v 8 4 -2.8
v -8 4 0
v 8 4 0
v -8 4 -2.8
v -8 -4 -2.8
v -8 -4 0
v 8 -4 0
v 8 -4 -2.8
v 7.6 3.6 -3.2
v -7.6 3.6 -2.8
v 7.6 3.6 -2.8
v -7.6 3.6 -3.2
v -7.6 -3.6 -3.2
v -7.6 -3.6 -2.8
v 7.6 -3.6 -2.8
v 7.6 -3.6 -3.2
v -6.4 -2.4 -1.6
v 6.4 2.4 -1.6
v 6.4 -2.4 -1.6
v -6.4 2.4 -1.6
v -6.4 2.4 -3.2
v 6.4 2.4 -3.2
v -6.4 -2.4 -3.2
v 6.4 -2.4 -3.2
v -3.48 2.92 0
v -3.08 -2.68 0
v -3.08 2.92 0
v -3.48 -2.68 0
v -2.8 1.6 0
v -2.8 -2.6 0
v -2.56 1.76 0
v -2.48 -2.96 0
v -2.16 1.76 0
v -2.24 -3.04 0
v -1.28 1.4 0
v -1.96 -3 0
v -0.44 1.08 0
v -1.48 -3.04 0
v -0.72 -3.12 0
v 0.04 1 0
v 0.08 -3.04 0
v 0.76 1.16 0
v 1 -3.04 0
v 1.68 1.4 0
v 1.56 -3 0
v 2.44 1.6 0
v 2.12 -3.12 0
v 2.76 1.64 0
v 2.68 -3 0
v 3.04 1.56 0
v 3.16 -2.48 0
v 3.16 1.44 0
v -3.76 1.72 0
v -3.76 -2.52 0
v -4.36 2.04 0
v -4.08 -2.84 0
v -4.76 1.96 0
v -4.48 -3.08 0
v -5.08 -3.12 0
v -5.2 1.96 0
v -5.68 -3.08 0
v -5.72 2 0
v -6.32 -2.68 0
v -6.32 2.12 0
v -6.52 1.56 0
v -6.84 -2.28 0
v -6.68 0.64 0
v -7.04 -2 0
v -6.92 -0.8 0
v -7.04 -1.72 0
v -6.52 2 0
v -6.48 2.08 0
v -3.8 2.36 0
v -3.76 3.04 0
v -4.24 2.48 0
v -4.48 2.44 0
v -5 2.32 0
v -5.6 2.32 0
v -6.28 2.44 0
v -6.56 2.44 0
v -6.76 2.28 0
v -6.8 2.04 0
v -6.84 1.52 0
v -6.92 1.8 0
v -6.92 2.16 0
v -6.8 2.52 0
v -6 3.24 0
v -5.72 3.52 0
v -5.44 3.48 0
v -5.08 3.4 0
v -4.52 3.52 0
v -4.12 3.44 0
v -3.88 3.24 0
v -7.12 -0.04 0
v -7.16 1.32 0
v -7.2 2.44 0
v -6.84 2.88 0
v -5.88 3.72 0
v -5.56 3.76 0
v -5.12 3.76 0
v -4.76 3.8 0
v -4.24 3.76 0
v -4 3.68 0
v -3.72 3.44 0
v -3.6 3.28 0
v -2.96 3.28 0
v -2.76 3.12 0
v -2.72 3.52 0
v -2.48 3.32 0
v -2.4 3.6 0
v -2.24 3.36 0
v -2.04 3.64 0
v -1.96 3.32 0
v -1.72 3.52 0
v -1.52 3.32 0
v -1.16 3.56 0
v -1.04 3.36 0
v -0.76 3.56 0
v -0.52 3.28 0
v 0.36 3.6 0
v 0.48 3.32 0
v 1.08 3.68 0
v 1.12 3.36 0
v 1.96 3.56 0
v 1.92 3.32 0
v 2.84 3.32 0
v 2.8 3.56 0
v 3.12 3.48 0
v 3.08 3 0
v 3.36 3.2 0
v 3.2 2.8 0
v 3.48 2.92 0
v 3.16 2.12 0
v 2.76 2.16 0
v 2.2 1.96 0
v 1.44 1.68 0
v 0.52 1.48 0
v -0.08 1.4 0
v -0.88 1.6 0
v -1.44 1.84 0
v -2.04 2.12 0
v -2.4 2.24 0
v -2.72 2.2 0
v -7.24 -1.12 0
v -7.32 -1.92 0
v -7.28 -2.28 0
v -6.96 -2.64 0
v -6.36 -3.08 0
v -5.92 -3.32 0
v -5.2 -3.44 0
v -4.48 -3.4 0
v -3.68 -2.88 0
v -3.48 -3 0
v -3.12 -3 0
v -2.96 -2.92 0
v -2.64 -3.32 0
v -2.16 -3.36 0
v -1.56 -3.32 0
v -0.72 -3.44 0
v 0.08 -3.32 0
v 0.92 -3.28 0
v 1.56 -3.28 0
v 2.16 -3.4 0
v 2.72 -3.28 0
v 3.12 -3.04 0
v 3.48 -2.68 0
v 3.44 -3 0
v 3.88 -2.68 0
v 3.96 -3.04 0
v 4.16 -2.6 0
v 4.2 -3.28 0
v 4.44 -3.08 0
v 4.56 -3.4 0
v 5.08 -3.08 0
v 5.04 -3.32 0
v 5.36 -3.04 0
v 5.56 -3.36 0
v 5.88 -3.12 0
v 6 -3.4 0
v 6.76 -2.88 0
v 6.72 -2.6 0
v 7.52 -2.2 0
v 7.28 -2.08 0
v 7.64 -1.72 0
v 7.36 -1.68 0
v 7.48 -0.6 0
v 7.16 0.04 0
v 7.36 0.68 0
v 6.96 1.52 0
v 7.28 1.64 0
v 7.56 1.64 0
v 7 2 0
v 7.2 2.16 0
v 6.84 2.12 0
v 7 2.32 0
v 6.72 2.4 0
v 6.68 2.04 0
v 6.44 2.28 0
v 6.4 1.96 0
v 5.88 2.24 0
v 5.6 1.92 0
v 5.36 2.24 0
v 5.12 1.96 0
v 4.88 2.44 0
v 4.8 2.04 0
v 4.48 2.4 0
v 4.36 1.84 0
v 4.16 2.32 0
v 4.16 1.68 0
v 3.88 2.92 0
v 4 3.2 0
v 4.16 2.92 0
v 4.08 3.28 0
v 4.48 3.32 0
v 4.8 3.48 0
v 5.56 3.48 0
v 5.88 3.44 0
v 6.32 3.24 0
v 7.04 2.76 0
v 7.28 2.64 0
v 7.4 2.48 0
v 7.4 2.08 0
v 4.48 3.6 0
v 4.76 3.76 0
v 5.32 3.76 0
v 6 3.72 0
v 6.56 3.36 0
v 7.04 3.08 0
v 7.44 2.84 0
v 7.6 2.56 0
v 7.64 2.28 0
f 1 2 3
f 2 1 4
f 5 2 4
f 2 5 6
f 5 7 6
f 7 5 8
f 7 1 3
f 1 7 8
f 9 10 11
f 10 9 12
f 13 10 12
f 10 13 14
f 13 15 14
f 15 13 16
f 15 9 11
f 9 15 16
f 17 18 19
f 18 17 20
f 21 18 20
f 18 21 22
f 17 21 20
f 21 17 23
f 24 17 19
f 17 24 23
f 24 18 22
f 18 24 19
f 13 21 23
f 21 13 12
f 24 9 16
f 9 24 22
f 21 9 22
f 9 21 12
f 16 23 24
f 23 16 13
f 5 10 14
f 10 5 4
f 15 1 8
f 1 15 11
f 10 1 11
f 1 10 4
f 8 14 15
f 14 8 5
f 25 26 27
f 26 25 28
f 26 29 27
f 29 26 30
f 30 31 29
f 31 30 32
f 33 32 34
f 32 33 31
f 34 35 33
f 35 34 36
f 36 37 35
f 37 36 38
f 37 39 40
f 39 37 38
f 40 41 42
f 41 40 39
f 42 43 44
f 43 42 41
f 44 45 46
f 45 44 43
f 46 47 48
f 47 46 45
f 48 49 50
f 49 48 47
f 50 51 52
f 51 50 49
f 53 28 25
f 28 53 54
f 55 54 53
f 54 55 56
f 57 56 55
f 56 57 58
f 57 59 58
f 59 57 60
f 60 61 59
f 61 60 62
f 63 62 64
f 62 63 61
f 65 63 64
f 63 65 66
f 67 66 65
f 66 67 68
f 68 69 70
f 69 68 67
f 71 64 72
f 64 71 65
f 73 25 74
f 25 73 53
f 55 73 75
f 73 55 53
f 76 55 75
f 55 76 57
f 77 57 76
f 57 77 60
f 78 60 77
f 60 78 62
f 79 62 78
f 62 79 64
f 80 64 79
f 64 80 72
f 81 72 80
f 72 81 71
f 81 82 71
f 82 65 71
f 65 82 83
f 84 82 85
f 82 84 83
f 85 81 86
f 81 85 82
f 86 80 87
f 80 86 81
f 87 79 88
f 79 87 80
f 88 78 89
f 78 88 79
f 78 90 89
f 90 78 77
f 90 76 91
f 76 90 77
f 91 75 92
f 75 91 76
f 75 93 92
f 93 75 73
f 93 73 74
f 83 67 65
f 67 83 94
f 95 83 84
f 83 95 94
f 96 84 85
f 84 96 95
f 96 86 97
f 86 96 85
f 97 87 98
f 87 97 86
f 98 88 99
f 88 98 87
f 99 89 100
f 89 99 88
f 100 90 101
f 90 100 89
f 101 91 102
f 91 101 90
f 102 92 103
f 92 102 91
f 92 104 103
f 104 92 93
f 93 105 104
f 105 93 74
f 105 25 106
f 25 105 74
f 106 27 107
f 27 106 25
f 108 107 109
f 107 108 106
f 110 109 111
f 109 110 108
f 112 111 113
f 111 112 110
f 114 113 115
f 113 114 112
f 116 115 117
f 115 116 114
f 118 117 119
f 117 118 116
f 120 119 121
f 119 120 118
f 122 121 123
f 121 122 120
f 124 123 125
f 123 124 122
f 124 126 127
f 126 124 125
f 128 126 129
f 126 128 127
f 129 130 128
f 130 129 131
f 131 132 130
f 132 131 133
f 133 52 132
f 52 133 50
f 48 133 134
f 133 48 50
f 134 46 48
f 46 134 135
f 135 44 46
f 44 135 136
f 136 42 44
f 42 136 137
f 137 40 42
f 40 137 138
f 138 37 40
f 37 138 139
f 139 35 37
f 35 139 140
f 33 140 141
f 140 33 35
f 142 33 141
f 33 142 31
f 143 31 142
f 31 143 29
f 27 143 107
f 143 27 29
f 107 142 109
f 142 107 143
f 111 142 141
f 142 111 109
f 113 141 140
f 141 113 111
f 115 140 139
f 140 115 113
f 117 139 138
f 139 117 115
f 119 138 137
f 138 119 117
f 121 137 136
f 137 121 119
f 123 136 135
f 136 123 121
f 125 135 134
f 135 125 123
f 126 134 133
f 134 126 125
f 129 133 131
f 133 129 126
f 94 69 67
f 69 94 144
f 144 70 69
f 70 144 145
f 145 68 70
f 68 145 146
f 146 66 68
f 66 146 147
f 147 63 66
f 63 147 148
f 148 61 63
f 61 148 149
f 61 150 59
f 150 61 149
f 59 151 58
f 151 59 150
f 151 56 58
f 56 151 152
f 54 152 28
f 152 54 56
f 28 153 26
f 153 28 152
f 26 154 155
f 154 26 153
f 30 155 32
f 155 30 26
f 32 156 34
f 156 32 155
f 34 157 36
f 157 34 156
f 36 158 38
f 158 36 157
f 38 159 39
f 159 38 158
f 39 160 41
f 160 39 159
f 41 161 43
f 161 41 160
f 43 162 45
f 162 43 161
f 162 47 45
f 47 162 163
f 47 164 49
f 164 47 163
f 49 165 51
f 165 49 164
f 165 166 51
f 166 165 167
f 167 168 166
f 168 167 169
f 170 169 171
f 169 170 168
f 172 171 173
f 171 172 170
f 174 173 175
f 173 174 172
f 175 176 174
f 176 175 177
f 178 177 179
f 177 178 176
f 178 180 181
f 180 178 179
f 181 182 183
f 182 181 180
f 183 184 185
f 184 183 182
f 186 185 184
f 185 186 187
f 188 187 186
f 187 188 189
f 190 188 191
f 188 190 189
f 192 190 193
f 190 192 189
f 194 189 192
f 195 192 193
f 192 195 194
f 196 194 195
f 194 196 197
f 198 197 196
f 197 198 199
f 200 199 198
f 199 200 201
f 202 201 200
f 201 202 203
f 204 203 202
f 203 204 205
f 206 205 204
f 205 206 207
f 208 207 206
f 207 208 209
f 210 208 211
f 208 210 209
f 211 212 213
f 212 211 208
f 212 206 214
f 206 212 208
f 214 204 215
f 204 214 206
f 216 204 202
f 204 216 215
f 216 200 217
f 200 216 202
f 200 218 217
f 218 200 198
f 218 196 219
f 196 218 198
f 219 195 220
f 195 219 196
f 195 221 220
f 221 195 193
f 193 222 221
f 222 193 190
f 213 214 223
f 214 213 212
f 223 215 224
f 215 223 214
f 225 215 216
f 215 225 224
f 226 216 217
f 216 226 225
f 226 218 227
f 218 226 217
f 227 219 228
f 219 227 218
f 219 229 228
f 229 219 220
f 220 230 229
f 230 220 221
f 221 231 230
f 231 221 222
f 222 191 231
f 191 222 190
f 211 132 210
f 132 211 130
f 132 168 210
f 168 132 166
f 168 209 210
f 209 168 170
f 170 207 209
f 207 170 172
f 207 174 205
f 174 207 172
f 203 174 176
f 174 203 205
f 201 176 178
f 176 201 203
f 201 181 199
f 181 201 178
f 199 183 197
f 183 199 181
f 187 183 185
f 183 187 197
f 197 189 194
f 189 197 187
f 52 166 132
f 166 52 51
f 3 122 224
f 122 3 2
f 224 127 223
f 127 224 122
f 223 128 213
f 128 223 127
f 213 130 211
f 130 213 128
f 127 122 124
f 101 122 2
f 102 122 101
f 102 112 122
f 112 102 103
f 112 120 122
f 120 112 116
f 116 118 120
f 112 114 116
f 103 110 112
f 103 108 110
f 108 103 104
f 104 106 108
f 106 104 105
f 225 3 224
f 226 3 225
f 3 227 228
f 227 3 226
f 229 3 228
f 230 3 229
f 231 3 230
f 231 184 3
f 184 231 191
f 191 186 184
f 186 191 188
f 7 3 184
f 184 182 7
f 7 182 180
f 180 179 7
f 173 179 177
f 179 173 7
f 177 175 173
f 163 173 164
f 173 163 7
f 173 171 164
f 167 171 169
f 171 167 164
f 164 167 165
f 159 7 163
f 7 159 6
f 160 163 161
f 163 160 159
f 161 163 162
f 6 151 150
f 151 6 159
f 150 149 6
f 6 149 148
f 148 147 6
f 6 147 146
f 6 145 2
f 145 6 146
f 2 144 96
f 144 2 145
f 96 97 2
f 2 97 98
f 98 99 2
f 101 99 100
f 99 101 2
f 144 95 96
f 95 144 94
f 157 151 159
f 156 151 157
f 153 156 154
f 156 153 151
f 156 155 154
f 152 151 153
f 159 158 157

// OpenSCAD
// file: ../p/box5.scad
use <../lib.scad>
function ldraw_lib__box5() = [
// 0 Box with 5 Faces and All Edges
// 0 Name: box5.dat
// 0 Author: James Jessiman
// 0 !LDRAW_ORG Primitive UPDATE 2012-01
// 0 !LICENSE Licensed under CC BY 2.0 and CC BY 4.0 : see CAreadme.txt
// 
// 0 BFC CERTIFY CCW
  [0,"BFC","CERTIFY"],
  [0,"BFC","CCW"],
// 
// 0 !HISTORY 2002-04-03 [sbliss] Modified for BFC compliance
// 0 !HISTORY 2002-04-25 [PTadmin] Official Update 2002-02
// 0 !HISTORY 2007-06-24 [PTadmin] Header formatted for Contributor Agreement
// 0 !HISTORY 2008-07-01 [PTadmin] Official Update 2008-01
// 0 !HISTORY 2012-02-16 [Philo] Changed to CCW
// 0 !HISTORY 2012-03-30 [PTadmin] Official Update 2012-01
// 
// 
// 2 24 1 1 1 -1 1 1
  [2,24,1,1,1,-1,1,1],
// 2 24 -1 1 1 -1 1 -1
  [2,24,-1,1,1,-1,1,-1],
// 2 24 -1 1 -1 1 1 -1
  [2,24,-1,1,-1,1,1,-1],
// 2 24 1 1 -1 1 1 1
  [2,24,1,1,-1,1,1,1],
// 2 24 1 0 1 -1 0 1
  [2,24,1,0,1,-1,0,1],
// 2 24 -1 0 1 -1 0 -1
  [2,24,-1,0,1,-1,0,-1],
// 2 24 -1 0 -1 1 0 -1
  [2,24,-1,0,-1,1,0,-1],
// 2 24 1 0 -1 1 0 1
  [2,24,1,0,-1,1,0,1],
// 2 24 1 0 1 1 1 1
  [2,24,1,0,1,1,1,1],
// 2 24 -1 0 1 -1 1 1
  [2,24,-1,0,1,-1,1,1],
// 2 24 1 0 -1 1 1 -1
  [2,24,1,0,-1,1,1,-1],
// 2 24 -1 0 -1 -1 1 -1
  [2,24,-1,0,-1,-1,1,-1],
// 4 16 -1 1 1 1 1 1 1 1 -1 -1 1 -1
  [4,16,-1,1,1,1,1,1,1,1,-1,-1,1,-1],
// 4 16 -1 1 1 -1 0 1 1 0 1 1 1 1
  [4,16,-1,1,1,-1,0,1,1,0,1,1,1,1],
// 4 16 -1 1 -1 -1 0 -1 -1 0 1 -1 1 1
  [4,16,-1,1,-1,-1,0,-1,-1,0,1,-1,1,1],
// 4 16 1 1 -1 1 0 -1 -1 0 -1 -1 1 -1
  [4,16,1,1,-1,1,0,-1,-1,0,-1,-1,1,-1],
// 4 16 1 1 1 1 0 1 1 0 -1 1 1 -1
  [4,16,1,1,1,1,0,1,1,0,-1,1,1,-1],
];
makepoly(ldraw_lib__box5(), line=0.2);
// file: ../p/box4.scad
use <../lib.scad>
function ldraw_lib__box4() = [
// 0 Box with 4 Faces (2 Parallel Pairs) and All Edges
// 0 Name: box4.dat
// 0 Author: James Jessiman
// 0 !LDRAW_ORG Primitive UPDATE 2012-01
// 0 !LICENSE Licensed under CC BY 2.0 and CC BY 4.0 : see CAreadme.txt
// 
// 0 BFC CERTIFY CCW
  [0,"BFC","CERTIFY"],
  [0,"BFC","CCW"],
// 
// 0 !HISTORY 2002-04-03 [sbliss] Modified for BFC compliance
// 0 !HISTORY 2002-04-25 [PTadmin] Official Update 2002-02
// 0 !HISTORY 2007-06-24 [PTadmin] Header formatted for Contributor Agreement
// 0 !HISTORY 2008-07-01 [PTadmin] Official Update 2008-01
// 0 !HISTORY 2012-02-16 [Philo] Changed to CCW
// 0 !HISTORY 2012-03-30 [PTadmin] Official Update 2012-01
// 
// 
// 2 24 1 1 1 -1 1 1
  [2,24,1,1,1,-1,1,1],
// 2 24 -1 1 1 -1 1 -1
  [2,24,-1,1,1,-1,1,-1],
// 2 24 -1 1 -1 1 1 -1
  [2,24,-1,1,-1,1,1,-1],
// 2 24 1 1 -1 1 1 1
  [2,24,1,1,-1,1,1,1],
// 2 24 1 0 1 -1 0 1
  [2,24,1,0,1,-1,0,1],
// 2 24 -1 0 1 -1 0 -1
  [2,24,-1,0,1,-1,0,-1],
// 2 24 -1 0 -1 1 0 -1
  [2,24,-1,0,-1,1,0,-1],
// 2 24 1 0 -1 1 0 1
  [2,24,1,0,-1,1,0,1],
// 2 24 1 0 1 1 1 1
  [2,24,1,0,1,1,1,1],
// 2 24 -1 0 1 -1 1 1
  [2,24,-1,0,1,-1,1,1],
// 2 24 1 0 -1 1 1 -1
  [2,24,1,0,-1,1,1,-1],
// 2 24 -1 0 -1 -1 1 -1
  [2,24,-1,0,-1,-1,1,-1],
// 4 16 -1 1 1 -1 0 1 1 0 1 1 1 1
  [4,16,-1,1,1,-1,0,1,1,0,1,1,1,1],
// 4 16 -1 1 -1 -1 0 -1 -1 0 1 -1 1 1
  [4,16,-1,1,-1,-1,0,-1,-1,0,1,-1,1,1],
// 4 16 1 1 -1 1 0 -1 -1 0 -1 -1 1 -1
  [4,16,1,1,-1,1,0,-1,-1,0,-1,-1,1,-1],
// 4 16 1 1 1 1 0 1 1 0 -1 1 1 -1
  [4,16,1,1,1,1,0,1,1,0,-1,1,1,-1],
];
makepoly(ldraw_lib__box4(), line=0.2);
// file: s/3069p0fs02.scad
use <../../lib.scad>
function ldraw_lib__s__3069p0fs02() = [
// 0 ~Tile  1 x  2 with Bedroll Pattern - Frame
// 0 Name: s\3069p0fs02.dat
// 0 Author: Alex Taylor [anathema]
// 0 !LDRAW_ORG Subpart UPDATE 2014-01
// 0 !LICENSE Licensed under CC BY 2.0 and CC BY 4.0 : see CAreadme.txt
// 
// 0 BFC CERTIFY CCW
  [0,"BFC","CERTIFY"],
  [0,"BFC","CCW"],
// 
// 0 !HISTORY 2014-01-18 [smr] moved bedroll frame from from 3069bp0f to s\3069p0fs02.dat
// 0 !HISTORY 2014-06-21 [PTadmin] Official Update 2014-01
// 
// 
// 4 16 11.9 0 9.4 20 0 10 -20 0 10 2.7 0 9.2
  [4,16,11.9,0,9.4,20,0,10,-20,0,10,2.7,0,9.2],
// 4 16 11.9 0 9.4 2.7 0 9.2 7 0 8.9 11.2 0 9
  [4,16,11.9,0,9.4,2.7,0,9.2,7,0,8.9,11.2,0,9],
// 4 16 11.2 0 9 7 0 8.9 7.8 0 8.7 10.2 0 8.2
  [4,16,11.2,0,9,7,0,8.9,7.8,0,8.7,10.2,0,8.2],
// 4 16 10.2 0 8.2 7.8 0 8.7 8.4 0 8 10 0 8
  [4,16,10.2,0,8.2,7.8,0,8.7,8.4,0,8,10,0,8],
// 3 16 7 0 8.9 2.7 0 9.2 4.9 0 8.9
  [3,16,7,0,8.9,2.7,0,9.2,4.9,0,8.9],
// 3 16 -11.9 0 9.5 2.7 0 9.2 -20 0 10
  [3,16,-11.9,0,9.5,2.7,0,9.2,-20,0,10],
// 3 16 -10.6 0 9.4 2.7 0 9.2 -11.9 0 9.5
  [3,16,-10.6,0,9.4,2.7,0,9.2,-11.9,0,9.5],
// 4 16 2.7 0 9.2 -10.6 0 9.4 -10 0 9.2 -5.1 0 9.1
  [4,16,2.7,0,9.2,-10.6,0,9.4,-10,0,9.2,-5.1,0,9.1],
// 4 16 2.7 0 9.2 -5.1 0 9.1 -2.9 0 8.9 0.9 0 9
  [4,16,2.7,0,9.2,-5.1,0,9.1,-2.9,0,8.9,0.9,0,9],
// 3 16 -2.9 0 8.9 -1.9 0 8.9 0.9 0 9
  [3,16,-2.9,0,8.9,-1.9,0,8.9,0.9,0,9],
// 3 16 -5.1 0 9.1 -4.3 0 8.8 -2.9 0 8.9
  [3,16,-5.1,0,9.1,-4.3,0,8.8,-2.9,0,8.9],
// 3 16 -10 0 9.2 -6 0 9 -5.1 0 9.1
  [3,16,-10,0,9.2,-6,0,9,-5.1,0,9.1],
// 4 16 -6.8 0 8.8 -6 0 9 -10 0 9.2 -9.3 0 8.6
  [4,16,-6.8,0,8.8,-6,0,9,-10,0,9.2,-9.3,0,8.6],
// 4 16 -7.4 0 8.2 -6.8 0 8.8 -9.3 0 8.6 -9 0 8.2
  [4,16,-7.4,0,8.2,-6.8,0,8.8,-9.3,0,8.6,-9,0,8.2],
// 3 16 13.3 0 9.4 20 0 10 11.9 0 9.4
  [3,16,13.3,0,9.4,20,0,10,11.9,0,9.4],
// 3 16 15 0 9.3 20 0 10 13.3 0 9.4
  [3,16,15,0,9.3,20,0,10,13.3,0,9.4],
// 4 16 20 0 10 15 0 9.3 16.4 0 8.4 17.6 0 7.7
  [4,16,20,0,10,15,0,9.3,16.4,0,8.4,17.6,0,7.7],
// 3 16 18.6 0 7.1 20 0 10 17.6 0 7.7
  [3,16,18.6,0,7.1,20,0,10,17.6,0,7.7],
// 3 16 19 0 6.4 20 0 10 18.6 0 7.1
  [3,16,19,0,6.4,20,0,10,18.6,0,7.1],
// 3 16 19.1 0 5.7 20 0 10 19 0 6.4
  [3,16,19.1,0,5.7,20,0,10,19,0,6.4],
// 4 16 19.1 0 -4.3 20 0 10 19.1 0 5.7 18.9 0 4.1
  [4,16,19.1,0,-4.3,20,0,10,19.1,0,5.7,18.9,0,4.1],
// 4 16 19.1 0 -4.3 18.9 0 4.1 18.4 0 1.7 18.7 0 -1.5
  [4,16,19.1,0,-4.3,18.9,0,4.1,18.4,0,1.7,18.7,0,-1.5],
// 3 16 20 0 -10 20 0 10 19.1 0 -4.3
  [3,16,20,0,-10,20,0,10,19.1,0,-4.3],
// 3 16 19.1 0 -4.3 18.8 0 -5.5 20 0 -10
  [3,16,19.1,0,-4.3,18.8,0,-5.5,20,0,-10],
// 3 16 20 0 -10 18.8 0 -5.5 16.9 0 -7.2
  [3,16,20,0,-10,18.8,0,-5.5,16.9,0,-7.2],
// 3 16 16.9 0 -7.2 15 0 -8.5 20 0 -10
  [3,16,16.9,0,-7.2,15,0,-8.5,20,0,-10],
// 4 16 11.4 0 -8.5 20 0 -10 15 0 -8.5 13.9 0 -8.4
  [4,16,11.4,0,-8.5,20,0,-10,15,0,-8.5,13.9,0,-8.4],
// 3 16 13.9 0 -8.4 12.6 0 -8.3 11.4 0 -8.5
  [3,16,13.9,0,-8.4,12.6,0,-8.3,11.4,0,-8.5],
// 4 16 5.4 0 -8.5 20 0 -10 11.4 0 -8.5 6.8 0 -8.2
  [4,16,5.4,0,-8.5,20,0,-10,11.4,0,-8.5,6.8,0,-8.2],
// 3 16 11.4 0 -8.5 10.5 0 -8.2 6.8 0 -8.2
  [3,16,11.4,0,-8.5,10.5,0,-8.2,6.8,0,-8.2],
// 4 16 6.8 0 -8.2 10.5 0 -8.2 9.9 0 -7.6 8.6 0 -7.5
  [4,16,6.8,0,-8.2,10.5,0,-8.2,9.9,0,-7.6,8.6,0,-7.5],
// 3 16 6.8 0 -8.2 8.6 0 -7.5 7.8 0 -7.6
  [3,16,6.8,0,-8.2,8.6,0,-7.5,7.8,0,-7.6],
// 4 16 -20 0 -10 20 0 -10 5.4 0 -8.5 -1.8 0 -8.6
  [4,16,-20,0,-10,20,0,-10,5.4,0,-8.5,-1.8,0,-8.6],
// 4 16 0.2 0 -8.3 -1.8 0 -8.6 5.4 0 -8.5 2.3 0 -8.2
  [4,16,0.2,0,-8.3,-1.8,0,-8.6,5.4,0,-8.5,2.3,0,-8.2],
// 3 16 2.3 0 -8.2 5.4 0 -8.5 3.9 0 -8.2
  [3,16,2.3,0,-8.2,5.4,0,-8.5,3.9,0,-8.2],
// 4 16 -20 0 -10 -1.8 0 -8.6 -11.2 0 -8.5 -13 0 -8.6
  [4,16,-20,0,-10,-1.8,0,-8.6,-11.2,0,-8.5,-13,0,-8.6],
// 3 16 -13 0 -8.6 -14.8 0 -8.3 -20 0 -10
  [3,16,-13,0,-8.6,-14.8,0,-8.3,-20,0,-10],
// 3 16 -20 0 -10 -14.8 0 -8.3 -15.9 0 -7.7
  [3,16,-20,0,-10,-14.8,0,-8.3,-15.9,0,-7.7],
// 3 16 -15.9 0 -7.7 -17.4 0 -6.6 -20 0 -10
  [3,16,-15.9,0,-7.7,-17.4,0,-6.6,-20,0,-10],
// 3 16 -20 0 -10 -17.4 0 -6.6 -18.2 0 -5.7
  [3,16,-20,0,-10,-17.4,0,-6.6,-18.2,0,-5.7],
// 4 16 -20 0 -10 -18.2 0 -5.7 -18.3 0 -4.8 -20 0 10
  [4,16,-20,0,-10,-18.2,0,-5.7,-18.3,0,-4.8,-20,0,10],
// 4 16 -18 0 6.1 -20 0 10 -18.3 0 -4.8 -18.1 0 -2.8
  [4,16,-18,0,6.1,-20,0,10,-18.3,0,-4.8,-18.1,0,-2.8],
// 3 16 -18 0 6.1 -17.1 0 7.2 -20 0 10
  [3,16,-18,0,6.1,-17.1,0,7.2,-20,0,10],
// 3 16 -20 0 10 -17.1 0 7.2 -14.7 0 9.3
  [3,16,-20,0,10,-17.1,0,7.2,-14.7,0,9.3],
// 3 16 -14.7 0 9.3 -13.9 0 9.4 -20 0 10
  [3,16,-14.7,0,9.3,-13.9,0,9.4,-20,0,10],
// 4 16 -20 0 10 -13.9 0 9.4 -12.8 0 9.4 -11.9 0 9.5
  [4,16,-20,0,10,-13.9,0,9.4,-12.8,0,9.4,-11.9,0,9.5],
// 4 16 -18.1 0 -2.8 -17.8 0 -0.1 -17.9 0 3.3 -18 0 6.1
  [4,16,-18.1,0,-2.8,-17.8,0,-0.1,-17.9,0,3.3,-18,0,6.1],
// 3 16 -5.4 0 -8.4 -11.2 0 -8.5 -1.8 0 -8.6
  [3,16,-5.4,0,-8.4,-11.2,0,-8.5,-1.8,0,-8.6],
// 3 16 -6.6 0 -8.3 -11.2 0 -8.5 -5.4 0 -8.4
  [3,16,-6.6,0,-8.3,-11.2,0,-8.5,-5.4,0,-8.4],
// 4 16 -11.2 0 -8.5 -6.6 0 -8.3 -7.8 0 -7.5 -8.7 0 -7.5
  [4,16,-11.2,0,-8.5,-6.6,0,-8.3,-7.8,0,-7.5,-8.7,0,-7.5],
// 3 16 -6.6 0 -8.3 -7.4 0 -7.3 -7.8 0 -7.5
  [3,16,-6.6,0,-8.3,-7.4,0,-7.3,-7.8,0,-7.5],
// 3 16 -9.2 0 -7.2 -11.2 0 -8.5 -8.7 0 -7.5
  [3,16,-9.2,0,-7.2,-11.2,0,-8.5,-8.7,0,-7.5],
// 3 16 -1.8 0 -8.6 -3.9 0 -8.3 -5.4 0 -8.4
  [3,16,-1.8,0,-8.6,-3.9,0,-8.3,-5.4,0,-8.4],
];
makepoly(ldraw_lib__s__3069p0fs02(), line=0.2);
// file: s/3069bs01.scad
use <../../lib.scad>
use <../../p/box4.scad>
use <../../p/box5.scad>
function ldraw_lib__s__3069bs01() = [
// 0 ~Tile  1 x  2 with Groove without Top Face
// 0 Name: s\3069bs01.dat
// 0 Author: Santeri Piippo [arezey]
// 0 !LDRAW_ORG Subpart UPDATE 2010-02
// 0 !LICENSE Licensed under CC BY 2.0 and CC BY 4.0 : see CAreadme.txt
// 
// 0 BFC CERTIFY CCW
  [0,"BFC","CERTIFY"],
  [0,"BFC","CCW"],
// 
// 0 !HISTORY 2010-07-05 [PTadmin] Official Update 2010-02
// 
// 
// 1 16 0 0 0 20 0 0 0 7 0 0 0 10 box4.dat
  [1,16,0,0,0,20,0,0,0,7,0,0,0,10, ldraw_lib__box4()],
// 1 16 0 7 0 19 0 0 0 1 0 0 0 9 box4.dat
  [1,16,0,7,0,19,0,0,0,1,0,0,0,9, ldraw_lib__box4()],
// 0 BFC INVERTNEXT
  [0,"BFC","INVERTNEXT"],
// 1 16 0 8 0 16 0 0 0 -4 0 0 0 6 box5.dat
  [1,16,0,8,0,16,0,0,0,-4,0,0,0,6, ldraw_lib__box5()],
// 4 16 -19 8 9 -16 8 6 -16 8 -6 -19 8 -9
  [4,16,-19,8,9,-16,8,6,-16,8,-6,-19,8,-9],
// 4 16 19 8 -9 16 8 -6 16 8 6 19 8 9
  [4,16,19,8,-9,16,8,-6,16,8,6,19,8,9],
// 4 16 19 8 9 16 8 6 -16 8 6 -19 8 9
  [4,16,19,8,9,16,8,6,-16,8,6,-19,8,9],
// 4 16 -19 8 -9 -16 8 -6 16 8 -6 19 8 -9
  [4,16,-19,8,-9,-16,8,-6,16,8,-6,19,8,-9],
// 4 16 -20 7 10 -19 7 9 -19 7 -9 -20 7 -10
  [4,16,-20,7,10,-19,7,9,-19,7,-9,-20,7,-10],
// 4 16 20 7 -10 19 7 -9 19 7 9 20 7 10
  [4,16,20,7,-10,19,7,-9,19,7,9,20,7,10],
// 4 16 20 7 10 19 7 9 -19 7 9 -20 7 10
  [4,16,20,7,10,19,7,9,-19,7,9,-20,7,10],
// 4 16 -20 7 -10 -19 7 -9 19 7 -9 20 7 -10
  [4,16,-20,7,-10,-19,7,-9,19,7,-9,20,7,-10],
// 0 //
];
makepoly(ldraw_lib__s__3069bs01(), line=0.2);
// main file
use <../lib.scad>
use <s/3069bs01.scad>
use <s/3069p0fs01.scad>
use <s/3069p0fs02.scad>
function ldraw_lib__3069bp0f() = [
// 0 Tile  1 x  2 with Light Grey Bedroll Pattern
// 0 Name: 3069bp0f.dat
// 0 Author: Alex Taylor [anathema]
// 0 !LDRAW_ORG Part UPDATE 2014-01
// 0 !LICENSE Licensed under CC BY 2.0 and CC BY 4.0 : see CAreadme.txt
// 
// 0 BFC CERTIFY CCW
  [0,"BFC","CERTIFY"],
  [0,"BFC","CCW"],
// 
// 0 !HISTORY 2009-12-29 [PTadmin] Official Update 2009-03
// 0 !HISTORY 2014-01-18 [smr] moved bedroll from 3069bp0f to s\3069p0fs01.dat
// 0 !HISTORY 2014-01-18 [smr] moved bedroll frame from 3069bp0f to s\3069p0fs02.dat
// 0 !HISTORY 2014-06-21 [PTadmin] Official Update 2014-01
// 
// 
// 1 16 0 0 0 1 0 0 0 1 0 0 0 1 s\3069bs01.dat
  [1,16,0,0,0,1,0,0,0,1,0,0,0,1, ldraw_lib__s__3069bs01()],
// 1 7 0 0 0 1 0 0 0 1 0 0 0 1 s\3069p0fs01.dat
  [1,7,0,0,0,1,0,0,0,1,0,0,0,1, ldraw_lib__s__3069p0fs01()],
// 1 16 0 0 0 1 0 0 0 1 0 0 0 1 s\3069p0fs02.dat
  [1,16,0,0,0,1,0,0,0,1,0,0,0,1, ldraw_lib__s__3069p0fs02()],
];
makepoly(ldraw_lib__3069bp0f(), line=0.2);
